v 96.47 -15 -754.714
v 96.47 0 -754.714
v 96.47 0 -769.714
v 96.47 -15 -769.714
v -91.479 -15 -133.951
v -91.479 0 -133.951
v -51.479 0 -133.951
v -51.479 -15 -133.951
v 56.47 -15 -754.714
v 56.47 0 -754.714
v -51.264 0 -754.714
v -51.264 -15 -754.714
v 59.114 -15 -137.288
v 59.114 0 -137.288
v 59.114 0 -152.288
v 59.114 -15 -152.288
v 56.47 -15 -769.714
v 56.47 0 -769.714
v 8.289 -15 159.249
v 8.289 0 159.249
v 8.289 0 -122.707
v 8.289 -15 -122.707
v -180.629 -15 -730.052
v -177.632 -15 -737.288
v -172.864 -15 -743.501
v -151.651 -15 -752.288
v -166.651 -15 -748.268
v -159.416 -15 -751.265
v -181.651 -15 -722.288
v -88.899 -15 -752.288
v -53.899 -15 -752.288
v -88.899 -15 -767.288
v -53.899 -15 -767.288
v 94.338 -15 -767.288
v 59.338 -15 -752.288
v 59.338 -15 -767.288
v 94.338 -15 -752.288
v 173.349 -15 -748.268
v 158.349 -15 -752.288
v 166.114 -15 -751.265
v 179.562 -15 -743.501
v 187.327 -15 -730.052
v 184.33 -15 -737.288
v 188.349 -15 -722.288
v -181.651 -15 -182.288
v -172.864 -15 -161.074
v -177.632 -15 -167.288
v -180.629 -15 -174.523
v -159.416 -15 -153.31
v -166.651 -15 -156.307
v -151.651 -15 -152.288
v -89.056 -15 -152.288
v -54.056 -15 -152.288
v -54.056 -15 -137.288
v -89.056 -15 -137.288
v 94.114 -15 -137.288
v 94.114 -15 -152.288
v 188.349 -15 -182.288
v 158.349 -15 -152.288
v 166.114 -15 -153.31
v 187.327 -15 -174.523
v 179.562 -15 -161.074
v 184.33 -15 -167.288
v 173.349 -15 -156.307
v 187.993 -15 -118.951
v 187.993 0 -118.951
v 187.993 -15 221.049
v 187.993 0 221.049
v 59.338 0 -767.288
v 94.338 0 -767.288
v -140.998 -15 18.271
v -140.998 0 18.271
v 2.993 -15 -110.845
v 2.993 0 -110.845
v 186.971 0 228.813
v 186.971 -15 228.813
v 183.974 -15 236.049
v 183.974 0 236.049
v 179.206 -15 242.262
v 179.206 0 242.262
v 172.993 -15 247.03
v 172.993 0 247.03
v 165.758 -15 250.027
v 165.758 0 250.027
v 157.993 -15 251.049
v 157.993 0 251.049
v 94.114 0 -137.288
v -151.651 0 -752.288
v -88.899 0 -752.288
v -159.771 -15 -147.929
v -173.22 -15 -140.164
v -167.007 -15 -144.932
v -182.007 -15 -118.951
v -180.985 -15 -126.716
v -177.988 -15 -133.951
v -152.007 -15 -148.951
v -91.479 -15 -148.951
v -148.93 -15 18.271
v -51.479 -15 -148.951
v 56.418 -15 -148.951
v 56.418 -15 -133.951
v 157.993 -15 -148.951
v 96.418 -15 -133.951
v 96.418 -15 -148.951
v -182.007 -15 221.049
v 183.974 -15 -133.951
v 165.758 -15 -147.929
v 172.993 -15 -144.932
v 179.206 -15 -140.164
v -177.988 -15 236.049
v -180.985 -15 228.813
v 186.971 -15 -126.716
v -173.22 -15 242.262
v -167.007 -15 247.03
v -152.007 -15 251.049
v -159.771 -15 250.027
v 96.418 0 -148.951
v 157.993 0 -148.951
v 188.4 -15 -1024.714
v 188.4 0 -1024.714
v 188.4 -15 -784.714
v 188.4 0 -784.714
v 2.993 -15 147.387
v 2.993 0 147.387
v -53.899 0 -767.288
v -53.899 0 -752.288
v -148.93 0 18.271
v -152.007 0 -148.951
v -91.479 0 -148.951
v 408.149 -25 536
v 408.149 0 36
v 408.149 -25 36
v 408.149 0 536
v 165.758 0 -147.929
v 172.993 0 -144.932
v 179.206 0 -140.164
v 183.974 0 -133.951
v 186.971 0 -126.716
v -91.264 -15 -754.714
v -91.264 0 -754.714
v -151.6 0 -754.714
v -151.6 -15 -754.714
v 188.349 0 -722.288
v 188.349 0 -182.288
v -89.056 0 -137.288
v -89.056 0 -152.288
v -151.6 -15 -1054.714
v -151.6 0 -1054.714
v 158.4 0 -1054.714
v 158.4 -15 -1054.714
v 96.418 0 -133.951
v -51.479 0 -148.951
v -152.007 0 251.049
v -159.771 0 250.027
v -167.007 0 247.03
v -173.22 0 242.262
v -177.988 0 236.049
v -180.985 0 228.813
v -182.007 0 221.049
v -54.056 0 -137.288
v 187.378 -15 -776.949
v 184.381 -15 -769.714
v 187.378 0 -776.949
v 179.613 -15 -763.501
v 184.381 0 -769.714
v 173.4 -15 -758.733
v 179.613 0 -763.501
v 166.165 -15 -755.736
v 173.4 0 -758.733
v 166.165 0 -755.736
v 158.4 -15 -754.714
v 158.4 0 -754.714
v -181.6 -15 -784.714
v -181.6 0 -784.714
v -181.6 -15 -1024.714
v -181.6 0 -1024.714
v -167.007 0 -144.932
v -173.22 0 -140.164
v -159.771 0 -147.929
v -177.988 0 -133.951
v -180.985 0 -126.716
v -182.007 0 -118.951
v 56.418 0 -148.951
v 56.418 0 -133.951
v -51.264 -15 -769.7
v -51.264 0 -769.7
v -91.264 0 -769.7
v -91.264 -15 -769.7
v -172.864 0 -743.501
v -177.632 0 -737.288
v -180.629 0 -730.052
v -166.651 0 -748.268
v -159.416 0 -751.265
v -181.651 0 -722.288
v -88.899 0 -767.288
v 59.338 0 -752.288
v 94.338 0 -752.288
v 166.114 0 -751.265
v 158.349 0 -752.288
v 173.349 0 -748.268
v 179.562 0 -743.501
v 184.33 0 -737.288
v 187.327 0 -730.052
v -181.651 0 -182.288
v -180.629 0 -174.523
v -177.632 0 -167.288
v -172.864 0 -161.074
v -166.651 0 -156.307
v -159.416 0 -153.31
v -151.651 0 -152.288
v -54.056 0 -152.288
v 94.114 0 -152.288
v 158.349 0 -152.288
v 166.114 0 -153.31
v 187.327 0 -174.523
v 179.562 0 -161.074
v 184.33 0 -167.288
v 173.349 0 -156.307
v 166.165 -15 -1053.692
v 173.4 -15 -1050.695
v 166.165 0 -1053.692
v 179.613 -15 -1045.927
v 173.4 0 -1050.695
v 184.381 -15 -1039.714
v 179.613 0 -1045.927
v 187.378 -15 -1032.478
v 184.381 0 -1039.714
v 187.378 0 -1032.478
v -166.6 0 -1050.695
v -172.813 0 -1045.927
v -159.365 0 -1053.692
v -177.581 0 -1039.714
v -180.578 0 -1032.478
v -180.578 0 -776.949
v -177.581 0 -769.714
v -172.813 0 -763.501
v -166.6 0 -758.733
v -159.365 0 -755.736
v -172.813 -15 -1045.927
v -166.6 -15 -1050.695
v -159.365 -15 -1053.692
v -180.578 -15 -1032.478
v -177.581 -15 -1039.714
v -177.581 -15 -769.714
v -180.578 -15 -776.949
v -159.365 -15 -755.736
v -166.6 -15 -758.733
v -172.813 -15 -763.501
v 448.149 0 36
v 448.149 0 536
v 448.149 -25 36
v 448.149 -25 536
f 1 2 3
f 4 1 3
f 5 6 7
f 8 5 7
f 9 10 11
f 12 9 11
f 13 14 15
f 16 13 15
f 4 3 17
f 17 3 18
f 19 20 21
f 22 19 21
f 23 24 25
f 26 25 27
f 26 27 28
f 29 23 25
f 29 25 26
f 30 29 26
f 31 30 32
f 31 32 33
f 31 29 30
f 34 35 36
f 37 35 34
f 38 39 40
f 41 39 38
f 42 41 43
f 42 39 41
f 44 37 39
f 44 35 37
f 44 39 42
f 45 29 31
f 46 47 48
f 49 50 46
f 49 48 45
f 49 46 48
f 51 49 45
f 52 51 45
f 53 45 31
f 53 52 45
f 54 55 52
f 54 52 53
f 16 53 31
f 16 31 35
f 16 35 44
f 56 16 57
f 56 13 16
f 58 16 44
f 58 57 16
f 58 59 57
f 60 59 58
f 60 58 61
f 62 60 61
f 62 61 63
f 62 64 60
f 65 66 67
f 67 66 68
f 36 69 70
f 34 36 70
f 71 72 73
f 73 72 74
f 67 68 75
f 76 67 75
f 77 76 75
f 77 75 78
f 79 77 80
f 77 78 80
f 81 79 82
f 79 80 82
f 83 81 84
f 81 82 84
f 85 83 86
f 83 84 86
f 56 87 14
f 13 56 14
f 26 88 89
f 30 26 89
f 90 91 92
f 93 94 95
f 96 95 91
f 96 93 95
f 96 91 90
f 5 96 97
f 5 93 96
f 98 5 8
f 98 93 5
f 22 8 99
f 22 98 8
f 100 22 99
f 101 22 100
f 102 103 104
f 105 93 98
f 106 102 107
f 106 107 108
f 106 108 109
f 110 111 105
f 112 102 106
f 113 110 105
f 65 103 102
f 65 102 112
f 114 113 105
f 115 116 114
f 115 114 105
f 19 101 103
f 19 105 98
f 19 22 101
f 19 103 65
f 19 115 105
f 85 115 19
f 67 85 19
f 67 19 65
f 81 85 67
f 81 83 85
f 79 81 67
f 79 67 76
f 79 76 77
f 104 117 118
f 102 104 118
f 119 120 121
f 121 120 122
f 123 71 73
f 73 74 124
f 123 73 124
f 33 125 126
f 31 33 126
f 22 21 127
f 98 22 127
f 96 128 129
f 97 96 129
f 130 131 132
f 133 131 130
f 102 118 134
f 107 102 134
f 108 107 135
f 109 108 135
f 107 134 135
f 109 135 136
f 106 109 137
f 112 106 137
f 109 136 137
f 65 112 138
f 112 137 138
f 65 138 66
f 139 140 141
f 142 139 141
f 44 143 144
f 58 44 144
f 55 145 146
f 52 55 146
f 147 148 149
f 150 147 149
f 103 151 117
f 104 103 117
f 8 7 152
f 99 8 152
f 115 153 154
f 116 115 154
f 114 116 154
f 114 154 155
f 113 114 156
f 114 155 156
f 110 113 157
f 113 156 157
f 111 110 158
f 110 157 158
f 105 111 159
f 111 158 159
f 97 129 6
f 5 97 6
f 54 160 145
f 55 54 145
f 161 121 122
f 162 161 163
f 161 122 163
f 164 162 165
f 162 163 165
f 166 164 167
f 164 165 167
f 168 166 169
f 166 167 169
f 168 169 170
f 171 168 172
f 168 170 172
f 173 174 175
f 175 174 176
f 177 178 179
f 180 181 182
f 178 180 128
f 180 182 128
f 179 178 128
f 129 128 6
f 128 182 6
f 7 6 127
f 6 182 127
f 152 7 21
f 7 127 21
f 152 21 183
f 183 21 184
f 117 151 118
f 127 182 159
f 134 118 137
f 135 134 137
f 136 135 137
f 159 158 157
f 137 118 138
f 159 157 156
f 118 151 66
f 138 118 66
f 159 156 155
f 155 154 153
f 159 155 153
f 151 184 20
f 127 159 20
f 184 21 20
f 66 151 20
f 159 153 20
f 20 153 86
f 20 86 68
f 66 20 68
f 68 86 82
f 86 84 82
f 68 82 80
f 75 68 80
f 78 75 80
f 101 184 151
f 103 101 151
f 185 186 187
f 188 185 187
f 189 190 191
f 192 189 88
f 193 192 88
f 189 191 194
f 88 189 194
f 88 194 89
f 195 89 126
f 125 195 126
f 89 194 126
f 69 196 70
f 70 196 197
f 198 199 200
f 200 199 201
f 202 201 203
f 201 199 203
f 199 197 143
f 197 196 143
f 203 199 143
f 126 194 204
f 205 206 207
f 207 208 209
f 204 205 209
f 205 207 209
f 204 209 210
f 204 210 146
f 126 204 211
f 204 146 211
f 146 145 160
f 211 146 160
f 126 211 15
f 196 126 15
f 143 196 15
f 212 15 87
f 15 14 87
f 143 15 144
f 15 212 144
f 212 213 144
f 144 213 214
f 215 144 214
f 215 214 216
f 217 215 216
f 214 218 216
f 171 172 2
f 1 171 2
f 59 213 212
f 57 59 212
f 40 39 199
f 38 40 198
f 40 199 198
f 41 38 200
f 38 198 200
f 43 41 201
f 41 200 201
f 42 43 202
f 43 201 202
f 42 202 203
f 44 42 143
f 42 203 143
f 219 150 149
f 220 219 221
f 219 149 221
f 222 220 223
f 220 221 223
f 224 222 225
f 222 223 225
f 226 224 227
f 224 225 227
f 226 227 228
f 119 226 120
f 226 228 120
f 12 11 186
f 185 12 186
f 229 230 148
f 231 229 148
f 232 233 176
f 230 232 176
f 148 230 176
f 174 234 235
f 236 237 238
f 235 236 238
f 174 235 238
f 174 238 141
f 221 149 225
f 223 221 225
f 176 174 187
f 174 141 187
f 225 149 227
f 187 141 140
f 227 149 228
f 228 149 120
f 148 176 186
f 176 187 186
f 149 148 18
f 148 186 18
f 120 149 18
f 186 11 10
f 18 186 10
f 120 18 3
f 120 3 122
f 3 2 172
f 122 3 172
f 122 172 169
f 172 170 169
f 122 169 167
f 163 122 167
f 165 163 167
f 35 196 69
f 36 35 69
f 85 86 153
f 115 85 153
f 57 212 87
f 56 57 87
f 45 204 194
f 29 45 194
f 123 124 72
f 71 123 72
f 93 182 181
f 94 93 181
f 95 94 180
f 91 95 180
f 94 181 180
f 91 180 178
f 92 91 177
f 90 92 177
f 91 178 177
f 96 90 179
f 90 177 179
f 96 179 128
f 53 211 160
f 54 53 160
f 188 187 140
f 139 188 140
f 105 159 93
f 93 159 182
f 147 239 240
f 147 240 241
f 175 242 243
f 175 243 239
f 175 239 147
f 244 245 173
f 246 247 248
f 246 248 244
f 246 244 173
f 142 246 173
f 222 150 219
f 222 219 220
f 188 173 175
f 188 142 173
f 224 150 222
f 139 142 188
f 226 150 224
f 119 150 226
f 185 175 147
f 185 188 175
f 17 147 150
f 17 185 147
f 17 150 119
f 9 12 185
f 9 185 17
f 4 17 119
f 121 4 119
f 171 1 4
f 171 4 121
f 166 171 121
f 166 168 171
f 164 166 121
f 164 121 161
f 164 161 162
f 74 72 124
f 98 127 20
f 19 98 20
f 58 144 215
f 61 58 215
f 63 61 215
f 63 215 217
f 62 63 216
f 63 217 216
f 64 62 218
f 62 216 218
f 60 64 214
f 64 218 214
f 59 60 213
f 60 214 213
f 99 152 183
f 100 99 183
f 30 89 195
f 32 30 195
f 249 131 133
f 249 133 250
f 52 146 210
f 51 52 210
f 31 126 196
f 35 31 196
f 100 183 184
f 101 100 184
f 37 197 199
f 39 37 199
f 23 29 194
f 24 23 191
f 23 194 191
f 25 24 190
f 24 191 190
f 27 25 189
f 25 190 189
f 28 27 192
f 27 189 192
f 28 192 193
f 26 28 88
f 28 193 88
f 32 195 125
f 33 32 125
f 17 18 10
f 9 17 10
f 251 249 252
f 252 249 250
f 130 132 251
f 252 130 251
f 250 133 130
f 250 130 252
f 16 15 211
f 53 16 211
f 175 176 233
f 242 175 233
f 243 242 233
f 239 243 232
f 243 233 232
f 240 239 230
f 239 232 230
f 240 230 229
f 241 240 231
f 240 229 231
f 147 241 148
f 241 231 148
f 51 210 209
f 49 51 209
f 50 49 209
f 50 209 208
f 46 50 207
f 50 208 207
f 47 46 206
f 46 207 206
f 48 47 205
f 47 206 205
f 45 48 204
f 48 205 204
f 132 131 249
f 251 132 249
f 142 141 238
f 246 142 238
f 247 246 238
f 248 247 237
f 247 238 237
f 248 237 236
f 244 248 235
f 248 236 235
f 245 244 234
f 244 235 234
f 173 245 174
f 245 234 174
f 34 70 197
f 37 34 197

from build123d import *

# Parameters (mm, degrees)
F1_DEPTH = 15
F2_DEPTH = 15
F0_W     = 40
F0_H     = 500
F3_DEPTH = 25


# Not quite as in the source:
# - a feature names something its author has since deleted; it is built from what else it names


with BuildPart() as f1:
    # F0 (on Front) → F1 (new body)
    with BuildSketch(Plane.XZ):
        with BuildLine():
            Line((157.9930828999, 251.0488363948), (-152.0069171001, 251.0488363948))
            ThreePointArc((-152.0069171001, 251.0488363948), (-173.2201205357, 242.2620398304), (-182.0069171001, 221.0488363948))
            Line((-182.0069171001, 221.0488363948), (-182.0069171001, -118.9511636052))
            ThreePointArc((-182.0069171001, -118.9511636052), (-173.2201205357, -140.1643670408), (-152.0069171001, -148.9511636052))
            Line((-152.0069171001, -148.9511636052), (-91.4793238044, -148.9511636052))
            Line((-91.4793238044, -148.9511636052), (-91.4793238044, -133.9511636052))
            Line((-91.4793238044, -133.9511636052), (-51.4793238044, -133.9511636052))
            Line((-51.4793238044, -133.9511636052), (-51.4793238044, -148.9511636052))
            Line((-51.4793238044, -148.9511636052), (56.4180724323, -148.9511636052))
            Line((56.4180724323, -148.9511636052), (56.4180724323, -133.9511636052))
            Line((56.4180724323, -133.9511636052), (96.4180724323, -133.9511636052))
            Line((96.4180724323, -133.9511636052), (96.4180724323, -148.9511636052))
            Line((96.4180724323, -148.9511636052), (157.9930828999, -148.9511636052))
            ThreePointArc((157.9930828999, -148.9511636052), (179.2062863355, -140.1643670408), (187.9930828999, -118.9511636052))
            Line((187.9930828999, -118.9511636052), (187.9930828999, 221.0488363948))
            ThreePointArc((187.9930828999, 221.0488363948), (179.2062863355, 242.2620398304), (157.9930828999, 251.0488363948))
        make_face()
        Polygon((8.2889962941, 159.2487096786), (8.2889962941, -122.7074861526), (-148.9303992233, 18.270611763), align=None, mode=Mode.SUBTRACT)
    extrude(amount=F1_DEPTH)


with BuildPart() as f2:
    # F0 (on Front) → F2 (new body)
    with BuildSketch(Plane.XZ):
        with BuildLine():
            Line((-89.0557542443, -152.287649894), (-151.6510576755, -152.287649894))
            ThreePointArc((-151.6510576755, -152.287649894), (-172.8642611111, -161.0744464584), (-181.6510576755, -182.287649894))
            Line((-181.6510576755, -182.287649894), (-181.6510576755, -722.287649894))
            ThreePointArc((-181.6510576755, -722.287649894), (-172.8642611111, -743.5008533296), (-151.6510576755, -752.287649894))
            Line((-151.6510576755, -752.287649894), (-88.8991951942, -752.287649894))
            Line((-88.8991951942, -752.287649894), (-88.8991951942, -767.287649894))
            Line((-88.8991951942, -767.287649894), (-53.8991951942, -767.287649894))
            Line((-53.8991951942, -767.287649894), (-53.8991951942, -752.287649894))
            Line((-53.8991951942, -752.287649894), (59.3375265598, -752.287649894))
            Line((59.3375265598, -752.287649894), (59.3375265598, -767.287649894))
            Line((59.3375265598, -767.287649894), (94.3375265598, -767.287649894))
            Line((94.3375265598, -767.287649894), (94.3375265598, -752.287649894))
            Line((94.3375265598, -752.287649894), (158.3489423245, -752.287649894))
            ThreePointArc((158.3489423245, -752.287649894), (179.5621457601, -743.5008533296), (188.3489423245, -722.287649894))
            Line((188.3489423245, -722.287649894), (188.3489423245, -182.287649894))
            ThreePointArc((188.3489423245, -182.287649894), (179.5621457601, -161.0744464584), (158.3489423245, -152.287649894))
            Line((158.3489423245, -152.287649894), (94.114292264, -152.287649894))
            Line((94.114292264, -152.287649894), (94.114292264, -137.287649894))
            Line((94.114292264, -137.287649894), (59.114292264, -137.287649894))
            Line((59.114292264, -137.287649894), (59.114292264, -152.287649894))
            Line((59.114292264, -152.287649894), (-54.0557542443, -152.287649894))
            Line((-54.0557542443, -152.287649894), (-54.0557542443, -137.287649894))
            Line((-54.0557542443, -137.287649894), (-89.0557542443, -137.287649894))
            Line((-89.0557542443, -137.287649894), (-89.0557542443, -152.287649894))
        make_face()
    extrude(amount=F2_DEPTH)


with BuildPart() as f2b:
    # F0 (on Front) → F2, piece 2 (new body)
    with BuildSketch(Plane.XZ):
        with BuildLine():
            Line((-91.2640253641, -754.7138333321), (-151.6000044346, -754.7138333321))
            ThreePointArc((-151.6000044346, -754.7138333321), (-172.8132078702, -763.5006298965), (-181.6000044346, -784.7138333321))
            Line((-181.6000044346, -784.7138333321), (-181.6000044346, -1024.7138333321))
            ThreePointArc((-181.6000044346, -1024.7138333321), (-172.8132078702, -1045.9270367677), (-151.6000044346, -1054.7138333321))
            Line((-151.6000044346, -1054.7138333321), (-91.3764173724, -1054.7138333321))
            Line((-91.3764173724, -1054.7138333321), (56.5209788643, -1054.7138333321))
            Line((56.5209788643, -1054.7138333321), (158.3999955654, -1054.7138333321))
            ThreePointArc((158.3999955654, -1054.7138333321), (179.613199001, -1045.9270367677), (188.3999955654, -1024.7138333321))
            Line((188.3999955654, -1024.7138333321), (188.3999955654, -784.7138333321))
            ThreePointArc((188.3999955654, -784.7138333321), (179.613199001, -763.5006298965), (158.3999955654, -754.7138333321))
            Line((158.3999955654, -754.7138333321), (96.4699256234, -754.7138333321))
            Line((96.4699256234, -754.7138333321), (96.4699256234, -769.7138333321))
            Line((96.4699256234, -769.7138333321), (56.4699256234, -769.7138333321))
            Line((56.4699256234, -769.7138333321), (56.4699256234, -754.7138333321))
            Line((56.4699256234, -754.7138333321), (-51.2640253641, -754.7138333321))
            Line((-51.2640253641, -754.7138333321), (-51.2640253641, -769.7001099586))
            Line((-51.2640253641, -769.7001099586), (-91.2640253641, -769.7001099586))
            Line((-91.2640253641, -769.7001099586), (-91.2640253641, -754.7138333321))
        make_face()
    extrude(amount=F2_DEPTH)


with BuildPart() as f2c:
    # F0 (on Front) → F2, piece 3 (new body)
    with BuildSketch(Plane.XZ):
        Polygon((2.9930828999, -110.8454271421), (2.9930828999, 147.3866506681), (-140.9976921807, 18.270611763), align=None)
    extrude(amount=F2_DEPTH)


with BuildPart() as f3:
    # F0 (on Front) → F3 (new body)
    with BuildSketch(Plane.XZ):
        with Locations((428.1492424011, 285.9999984503)):
            Rectangle(F0_W, F0_H)
    extrude(amount=F3_DEPTH)


solid = Compound([f1.part, f2.part, f2b.part, f2c.part, f3.part])
